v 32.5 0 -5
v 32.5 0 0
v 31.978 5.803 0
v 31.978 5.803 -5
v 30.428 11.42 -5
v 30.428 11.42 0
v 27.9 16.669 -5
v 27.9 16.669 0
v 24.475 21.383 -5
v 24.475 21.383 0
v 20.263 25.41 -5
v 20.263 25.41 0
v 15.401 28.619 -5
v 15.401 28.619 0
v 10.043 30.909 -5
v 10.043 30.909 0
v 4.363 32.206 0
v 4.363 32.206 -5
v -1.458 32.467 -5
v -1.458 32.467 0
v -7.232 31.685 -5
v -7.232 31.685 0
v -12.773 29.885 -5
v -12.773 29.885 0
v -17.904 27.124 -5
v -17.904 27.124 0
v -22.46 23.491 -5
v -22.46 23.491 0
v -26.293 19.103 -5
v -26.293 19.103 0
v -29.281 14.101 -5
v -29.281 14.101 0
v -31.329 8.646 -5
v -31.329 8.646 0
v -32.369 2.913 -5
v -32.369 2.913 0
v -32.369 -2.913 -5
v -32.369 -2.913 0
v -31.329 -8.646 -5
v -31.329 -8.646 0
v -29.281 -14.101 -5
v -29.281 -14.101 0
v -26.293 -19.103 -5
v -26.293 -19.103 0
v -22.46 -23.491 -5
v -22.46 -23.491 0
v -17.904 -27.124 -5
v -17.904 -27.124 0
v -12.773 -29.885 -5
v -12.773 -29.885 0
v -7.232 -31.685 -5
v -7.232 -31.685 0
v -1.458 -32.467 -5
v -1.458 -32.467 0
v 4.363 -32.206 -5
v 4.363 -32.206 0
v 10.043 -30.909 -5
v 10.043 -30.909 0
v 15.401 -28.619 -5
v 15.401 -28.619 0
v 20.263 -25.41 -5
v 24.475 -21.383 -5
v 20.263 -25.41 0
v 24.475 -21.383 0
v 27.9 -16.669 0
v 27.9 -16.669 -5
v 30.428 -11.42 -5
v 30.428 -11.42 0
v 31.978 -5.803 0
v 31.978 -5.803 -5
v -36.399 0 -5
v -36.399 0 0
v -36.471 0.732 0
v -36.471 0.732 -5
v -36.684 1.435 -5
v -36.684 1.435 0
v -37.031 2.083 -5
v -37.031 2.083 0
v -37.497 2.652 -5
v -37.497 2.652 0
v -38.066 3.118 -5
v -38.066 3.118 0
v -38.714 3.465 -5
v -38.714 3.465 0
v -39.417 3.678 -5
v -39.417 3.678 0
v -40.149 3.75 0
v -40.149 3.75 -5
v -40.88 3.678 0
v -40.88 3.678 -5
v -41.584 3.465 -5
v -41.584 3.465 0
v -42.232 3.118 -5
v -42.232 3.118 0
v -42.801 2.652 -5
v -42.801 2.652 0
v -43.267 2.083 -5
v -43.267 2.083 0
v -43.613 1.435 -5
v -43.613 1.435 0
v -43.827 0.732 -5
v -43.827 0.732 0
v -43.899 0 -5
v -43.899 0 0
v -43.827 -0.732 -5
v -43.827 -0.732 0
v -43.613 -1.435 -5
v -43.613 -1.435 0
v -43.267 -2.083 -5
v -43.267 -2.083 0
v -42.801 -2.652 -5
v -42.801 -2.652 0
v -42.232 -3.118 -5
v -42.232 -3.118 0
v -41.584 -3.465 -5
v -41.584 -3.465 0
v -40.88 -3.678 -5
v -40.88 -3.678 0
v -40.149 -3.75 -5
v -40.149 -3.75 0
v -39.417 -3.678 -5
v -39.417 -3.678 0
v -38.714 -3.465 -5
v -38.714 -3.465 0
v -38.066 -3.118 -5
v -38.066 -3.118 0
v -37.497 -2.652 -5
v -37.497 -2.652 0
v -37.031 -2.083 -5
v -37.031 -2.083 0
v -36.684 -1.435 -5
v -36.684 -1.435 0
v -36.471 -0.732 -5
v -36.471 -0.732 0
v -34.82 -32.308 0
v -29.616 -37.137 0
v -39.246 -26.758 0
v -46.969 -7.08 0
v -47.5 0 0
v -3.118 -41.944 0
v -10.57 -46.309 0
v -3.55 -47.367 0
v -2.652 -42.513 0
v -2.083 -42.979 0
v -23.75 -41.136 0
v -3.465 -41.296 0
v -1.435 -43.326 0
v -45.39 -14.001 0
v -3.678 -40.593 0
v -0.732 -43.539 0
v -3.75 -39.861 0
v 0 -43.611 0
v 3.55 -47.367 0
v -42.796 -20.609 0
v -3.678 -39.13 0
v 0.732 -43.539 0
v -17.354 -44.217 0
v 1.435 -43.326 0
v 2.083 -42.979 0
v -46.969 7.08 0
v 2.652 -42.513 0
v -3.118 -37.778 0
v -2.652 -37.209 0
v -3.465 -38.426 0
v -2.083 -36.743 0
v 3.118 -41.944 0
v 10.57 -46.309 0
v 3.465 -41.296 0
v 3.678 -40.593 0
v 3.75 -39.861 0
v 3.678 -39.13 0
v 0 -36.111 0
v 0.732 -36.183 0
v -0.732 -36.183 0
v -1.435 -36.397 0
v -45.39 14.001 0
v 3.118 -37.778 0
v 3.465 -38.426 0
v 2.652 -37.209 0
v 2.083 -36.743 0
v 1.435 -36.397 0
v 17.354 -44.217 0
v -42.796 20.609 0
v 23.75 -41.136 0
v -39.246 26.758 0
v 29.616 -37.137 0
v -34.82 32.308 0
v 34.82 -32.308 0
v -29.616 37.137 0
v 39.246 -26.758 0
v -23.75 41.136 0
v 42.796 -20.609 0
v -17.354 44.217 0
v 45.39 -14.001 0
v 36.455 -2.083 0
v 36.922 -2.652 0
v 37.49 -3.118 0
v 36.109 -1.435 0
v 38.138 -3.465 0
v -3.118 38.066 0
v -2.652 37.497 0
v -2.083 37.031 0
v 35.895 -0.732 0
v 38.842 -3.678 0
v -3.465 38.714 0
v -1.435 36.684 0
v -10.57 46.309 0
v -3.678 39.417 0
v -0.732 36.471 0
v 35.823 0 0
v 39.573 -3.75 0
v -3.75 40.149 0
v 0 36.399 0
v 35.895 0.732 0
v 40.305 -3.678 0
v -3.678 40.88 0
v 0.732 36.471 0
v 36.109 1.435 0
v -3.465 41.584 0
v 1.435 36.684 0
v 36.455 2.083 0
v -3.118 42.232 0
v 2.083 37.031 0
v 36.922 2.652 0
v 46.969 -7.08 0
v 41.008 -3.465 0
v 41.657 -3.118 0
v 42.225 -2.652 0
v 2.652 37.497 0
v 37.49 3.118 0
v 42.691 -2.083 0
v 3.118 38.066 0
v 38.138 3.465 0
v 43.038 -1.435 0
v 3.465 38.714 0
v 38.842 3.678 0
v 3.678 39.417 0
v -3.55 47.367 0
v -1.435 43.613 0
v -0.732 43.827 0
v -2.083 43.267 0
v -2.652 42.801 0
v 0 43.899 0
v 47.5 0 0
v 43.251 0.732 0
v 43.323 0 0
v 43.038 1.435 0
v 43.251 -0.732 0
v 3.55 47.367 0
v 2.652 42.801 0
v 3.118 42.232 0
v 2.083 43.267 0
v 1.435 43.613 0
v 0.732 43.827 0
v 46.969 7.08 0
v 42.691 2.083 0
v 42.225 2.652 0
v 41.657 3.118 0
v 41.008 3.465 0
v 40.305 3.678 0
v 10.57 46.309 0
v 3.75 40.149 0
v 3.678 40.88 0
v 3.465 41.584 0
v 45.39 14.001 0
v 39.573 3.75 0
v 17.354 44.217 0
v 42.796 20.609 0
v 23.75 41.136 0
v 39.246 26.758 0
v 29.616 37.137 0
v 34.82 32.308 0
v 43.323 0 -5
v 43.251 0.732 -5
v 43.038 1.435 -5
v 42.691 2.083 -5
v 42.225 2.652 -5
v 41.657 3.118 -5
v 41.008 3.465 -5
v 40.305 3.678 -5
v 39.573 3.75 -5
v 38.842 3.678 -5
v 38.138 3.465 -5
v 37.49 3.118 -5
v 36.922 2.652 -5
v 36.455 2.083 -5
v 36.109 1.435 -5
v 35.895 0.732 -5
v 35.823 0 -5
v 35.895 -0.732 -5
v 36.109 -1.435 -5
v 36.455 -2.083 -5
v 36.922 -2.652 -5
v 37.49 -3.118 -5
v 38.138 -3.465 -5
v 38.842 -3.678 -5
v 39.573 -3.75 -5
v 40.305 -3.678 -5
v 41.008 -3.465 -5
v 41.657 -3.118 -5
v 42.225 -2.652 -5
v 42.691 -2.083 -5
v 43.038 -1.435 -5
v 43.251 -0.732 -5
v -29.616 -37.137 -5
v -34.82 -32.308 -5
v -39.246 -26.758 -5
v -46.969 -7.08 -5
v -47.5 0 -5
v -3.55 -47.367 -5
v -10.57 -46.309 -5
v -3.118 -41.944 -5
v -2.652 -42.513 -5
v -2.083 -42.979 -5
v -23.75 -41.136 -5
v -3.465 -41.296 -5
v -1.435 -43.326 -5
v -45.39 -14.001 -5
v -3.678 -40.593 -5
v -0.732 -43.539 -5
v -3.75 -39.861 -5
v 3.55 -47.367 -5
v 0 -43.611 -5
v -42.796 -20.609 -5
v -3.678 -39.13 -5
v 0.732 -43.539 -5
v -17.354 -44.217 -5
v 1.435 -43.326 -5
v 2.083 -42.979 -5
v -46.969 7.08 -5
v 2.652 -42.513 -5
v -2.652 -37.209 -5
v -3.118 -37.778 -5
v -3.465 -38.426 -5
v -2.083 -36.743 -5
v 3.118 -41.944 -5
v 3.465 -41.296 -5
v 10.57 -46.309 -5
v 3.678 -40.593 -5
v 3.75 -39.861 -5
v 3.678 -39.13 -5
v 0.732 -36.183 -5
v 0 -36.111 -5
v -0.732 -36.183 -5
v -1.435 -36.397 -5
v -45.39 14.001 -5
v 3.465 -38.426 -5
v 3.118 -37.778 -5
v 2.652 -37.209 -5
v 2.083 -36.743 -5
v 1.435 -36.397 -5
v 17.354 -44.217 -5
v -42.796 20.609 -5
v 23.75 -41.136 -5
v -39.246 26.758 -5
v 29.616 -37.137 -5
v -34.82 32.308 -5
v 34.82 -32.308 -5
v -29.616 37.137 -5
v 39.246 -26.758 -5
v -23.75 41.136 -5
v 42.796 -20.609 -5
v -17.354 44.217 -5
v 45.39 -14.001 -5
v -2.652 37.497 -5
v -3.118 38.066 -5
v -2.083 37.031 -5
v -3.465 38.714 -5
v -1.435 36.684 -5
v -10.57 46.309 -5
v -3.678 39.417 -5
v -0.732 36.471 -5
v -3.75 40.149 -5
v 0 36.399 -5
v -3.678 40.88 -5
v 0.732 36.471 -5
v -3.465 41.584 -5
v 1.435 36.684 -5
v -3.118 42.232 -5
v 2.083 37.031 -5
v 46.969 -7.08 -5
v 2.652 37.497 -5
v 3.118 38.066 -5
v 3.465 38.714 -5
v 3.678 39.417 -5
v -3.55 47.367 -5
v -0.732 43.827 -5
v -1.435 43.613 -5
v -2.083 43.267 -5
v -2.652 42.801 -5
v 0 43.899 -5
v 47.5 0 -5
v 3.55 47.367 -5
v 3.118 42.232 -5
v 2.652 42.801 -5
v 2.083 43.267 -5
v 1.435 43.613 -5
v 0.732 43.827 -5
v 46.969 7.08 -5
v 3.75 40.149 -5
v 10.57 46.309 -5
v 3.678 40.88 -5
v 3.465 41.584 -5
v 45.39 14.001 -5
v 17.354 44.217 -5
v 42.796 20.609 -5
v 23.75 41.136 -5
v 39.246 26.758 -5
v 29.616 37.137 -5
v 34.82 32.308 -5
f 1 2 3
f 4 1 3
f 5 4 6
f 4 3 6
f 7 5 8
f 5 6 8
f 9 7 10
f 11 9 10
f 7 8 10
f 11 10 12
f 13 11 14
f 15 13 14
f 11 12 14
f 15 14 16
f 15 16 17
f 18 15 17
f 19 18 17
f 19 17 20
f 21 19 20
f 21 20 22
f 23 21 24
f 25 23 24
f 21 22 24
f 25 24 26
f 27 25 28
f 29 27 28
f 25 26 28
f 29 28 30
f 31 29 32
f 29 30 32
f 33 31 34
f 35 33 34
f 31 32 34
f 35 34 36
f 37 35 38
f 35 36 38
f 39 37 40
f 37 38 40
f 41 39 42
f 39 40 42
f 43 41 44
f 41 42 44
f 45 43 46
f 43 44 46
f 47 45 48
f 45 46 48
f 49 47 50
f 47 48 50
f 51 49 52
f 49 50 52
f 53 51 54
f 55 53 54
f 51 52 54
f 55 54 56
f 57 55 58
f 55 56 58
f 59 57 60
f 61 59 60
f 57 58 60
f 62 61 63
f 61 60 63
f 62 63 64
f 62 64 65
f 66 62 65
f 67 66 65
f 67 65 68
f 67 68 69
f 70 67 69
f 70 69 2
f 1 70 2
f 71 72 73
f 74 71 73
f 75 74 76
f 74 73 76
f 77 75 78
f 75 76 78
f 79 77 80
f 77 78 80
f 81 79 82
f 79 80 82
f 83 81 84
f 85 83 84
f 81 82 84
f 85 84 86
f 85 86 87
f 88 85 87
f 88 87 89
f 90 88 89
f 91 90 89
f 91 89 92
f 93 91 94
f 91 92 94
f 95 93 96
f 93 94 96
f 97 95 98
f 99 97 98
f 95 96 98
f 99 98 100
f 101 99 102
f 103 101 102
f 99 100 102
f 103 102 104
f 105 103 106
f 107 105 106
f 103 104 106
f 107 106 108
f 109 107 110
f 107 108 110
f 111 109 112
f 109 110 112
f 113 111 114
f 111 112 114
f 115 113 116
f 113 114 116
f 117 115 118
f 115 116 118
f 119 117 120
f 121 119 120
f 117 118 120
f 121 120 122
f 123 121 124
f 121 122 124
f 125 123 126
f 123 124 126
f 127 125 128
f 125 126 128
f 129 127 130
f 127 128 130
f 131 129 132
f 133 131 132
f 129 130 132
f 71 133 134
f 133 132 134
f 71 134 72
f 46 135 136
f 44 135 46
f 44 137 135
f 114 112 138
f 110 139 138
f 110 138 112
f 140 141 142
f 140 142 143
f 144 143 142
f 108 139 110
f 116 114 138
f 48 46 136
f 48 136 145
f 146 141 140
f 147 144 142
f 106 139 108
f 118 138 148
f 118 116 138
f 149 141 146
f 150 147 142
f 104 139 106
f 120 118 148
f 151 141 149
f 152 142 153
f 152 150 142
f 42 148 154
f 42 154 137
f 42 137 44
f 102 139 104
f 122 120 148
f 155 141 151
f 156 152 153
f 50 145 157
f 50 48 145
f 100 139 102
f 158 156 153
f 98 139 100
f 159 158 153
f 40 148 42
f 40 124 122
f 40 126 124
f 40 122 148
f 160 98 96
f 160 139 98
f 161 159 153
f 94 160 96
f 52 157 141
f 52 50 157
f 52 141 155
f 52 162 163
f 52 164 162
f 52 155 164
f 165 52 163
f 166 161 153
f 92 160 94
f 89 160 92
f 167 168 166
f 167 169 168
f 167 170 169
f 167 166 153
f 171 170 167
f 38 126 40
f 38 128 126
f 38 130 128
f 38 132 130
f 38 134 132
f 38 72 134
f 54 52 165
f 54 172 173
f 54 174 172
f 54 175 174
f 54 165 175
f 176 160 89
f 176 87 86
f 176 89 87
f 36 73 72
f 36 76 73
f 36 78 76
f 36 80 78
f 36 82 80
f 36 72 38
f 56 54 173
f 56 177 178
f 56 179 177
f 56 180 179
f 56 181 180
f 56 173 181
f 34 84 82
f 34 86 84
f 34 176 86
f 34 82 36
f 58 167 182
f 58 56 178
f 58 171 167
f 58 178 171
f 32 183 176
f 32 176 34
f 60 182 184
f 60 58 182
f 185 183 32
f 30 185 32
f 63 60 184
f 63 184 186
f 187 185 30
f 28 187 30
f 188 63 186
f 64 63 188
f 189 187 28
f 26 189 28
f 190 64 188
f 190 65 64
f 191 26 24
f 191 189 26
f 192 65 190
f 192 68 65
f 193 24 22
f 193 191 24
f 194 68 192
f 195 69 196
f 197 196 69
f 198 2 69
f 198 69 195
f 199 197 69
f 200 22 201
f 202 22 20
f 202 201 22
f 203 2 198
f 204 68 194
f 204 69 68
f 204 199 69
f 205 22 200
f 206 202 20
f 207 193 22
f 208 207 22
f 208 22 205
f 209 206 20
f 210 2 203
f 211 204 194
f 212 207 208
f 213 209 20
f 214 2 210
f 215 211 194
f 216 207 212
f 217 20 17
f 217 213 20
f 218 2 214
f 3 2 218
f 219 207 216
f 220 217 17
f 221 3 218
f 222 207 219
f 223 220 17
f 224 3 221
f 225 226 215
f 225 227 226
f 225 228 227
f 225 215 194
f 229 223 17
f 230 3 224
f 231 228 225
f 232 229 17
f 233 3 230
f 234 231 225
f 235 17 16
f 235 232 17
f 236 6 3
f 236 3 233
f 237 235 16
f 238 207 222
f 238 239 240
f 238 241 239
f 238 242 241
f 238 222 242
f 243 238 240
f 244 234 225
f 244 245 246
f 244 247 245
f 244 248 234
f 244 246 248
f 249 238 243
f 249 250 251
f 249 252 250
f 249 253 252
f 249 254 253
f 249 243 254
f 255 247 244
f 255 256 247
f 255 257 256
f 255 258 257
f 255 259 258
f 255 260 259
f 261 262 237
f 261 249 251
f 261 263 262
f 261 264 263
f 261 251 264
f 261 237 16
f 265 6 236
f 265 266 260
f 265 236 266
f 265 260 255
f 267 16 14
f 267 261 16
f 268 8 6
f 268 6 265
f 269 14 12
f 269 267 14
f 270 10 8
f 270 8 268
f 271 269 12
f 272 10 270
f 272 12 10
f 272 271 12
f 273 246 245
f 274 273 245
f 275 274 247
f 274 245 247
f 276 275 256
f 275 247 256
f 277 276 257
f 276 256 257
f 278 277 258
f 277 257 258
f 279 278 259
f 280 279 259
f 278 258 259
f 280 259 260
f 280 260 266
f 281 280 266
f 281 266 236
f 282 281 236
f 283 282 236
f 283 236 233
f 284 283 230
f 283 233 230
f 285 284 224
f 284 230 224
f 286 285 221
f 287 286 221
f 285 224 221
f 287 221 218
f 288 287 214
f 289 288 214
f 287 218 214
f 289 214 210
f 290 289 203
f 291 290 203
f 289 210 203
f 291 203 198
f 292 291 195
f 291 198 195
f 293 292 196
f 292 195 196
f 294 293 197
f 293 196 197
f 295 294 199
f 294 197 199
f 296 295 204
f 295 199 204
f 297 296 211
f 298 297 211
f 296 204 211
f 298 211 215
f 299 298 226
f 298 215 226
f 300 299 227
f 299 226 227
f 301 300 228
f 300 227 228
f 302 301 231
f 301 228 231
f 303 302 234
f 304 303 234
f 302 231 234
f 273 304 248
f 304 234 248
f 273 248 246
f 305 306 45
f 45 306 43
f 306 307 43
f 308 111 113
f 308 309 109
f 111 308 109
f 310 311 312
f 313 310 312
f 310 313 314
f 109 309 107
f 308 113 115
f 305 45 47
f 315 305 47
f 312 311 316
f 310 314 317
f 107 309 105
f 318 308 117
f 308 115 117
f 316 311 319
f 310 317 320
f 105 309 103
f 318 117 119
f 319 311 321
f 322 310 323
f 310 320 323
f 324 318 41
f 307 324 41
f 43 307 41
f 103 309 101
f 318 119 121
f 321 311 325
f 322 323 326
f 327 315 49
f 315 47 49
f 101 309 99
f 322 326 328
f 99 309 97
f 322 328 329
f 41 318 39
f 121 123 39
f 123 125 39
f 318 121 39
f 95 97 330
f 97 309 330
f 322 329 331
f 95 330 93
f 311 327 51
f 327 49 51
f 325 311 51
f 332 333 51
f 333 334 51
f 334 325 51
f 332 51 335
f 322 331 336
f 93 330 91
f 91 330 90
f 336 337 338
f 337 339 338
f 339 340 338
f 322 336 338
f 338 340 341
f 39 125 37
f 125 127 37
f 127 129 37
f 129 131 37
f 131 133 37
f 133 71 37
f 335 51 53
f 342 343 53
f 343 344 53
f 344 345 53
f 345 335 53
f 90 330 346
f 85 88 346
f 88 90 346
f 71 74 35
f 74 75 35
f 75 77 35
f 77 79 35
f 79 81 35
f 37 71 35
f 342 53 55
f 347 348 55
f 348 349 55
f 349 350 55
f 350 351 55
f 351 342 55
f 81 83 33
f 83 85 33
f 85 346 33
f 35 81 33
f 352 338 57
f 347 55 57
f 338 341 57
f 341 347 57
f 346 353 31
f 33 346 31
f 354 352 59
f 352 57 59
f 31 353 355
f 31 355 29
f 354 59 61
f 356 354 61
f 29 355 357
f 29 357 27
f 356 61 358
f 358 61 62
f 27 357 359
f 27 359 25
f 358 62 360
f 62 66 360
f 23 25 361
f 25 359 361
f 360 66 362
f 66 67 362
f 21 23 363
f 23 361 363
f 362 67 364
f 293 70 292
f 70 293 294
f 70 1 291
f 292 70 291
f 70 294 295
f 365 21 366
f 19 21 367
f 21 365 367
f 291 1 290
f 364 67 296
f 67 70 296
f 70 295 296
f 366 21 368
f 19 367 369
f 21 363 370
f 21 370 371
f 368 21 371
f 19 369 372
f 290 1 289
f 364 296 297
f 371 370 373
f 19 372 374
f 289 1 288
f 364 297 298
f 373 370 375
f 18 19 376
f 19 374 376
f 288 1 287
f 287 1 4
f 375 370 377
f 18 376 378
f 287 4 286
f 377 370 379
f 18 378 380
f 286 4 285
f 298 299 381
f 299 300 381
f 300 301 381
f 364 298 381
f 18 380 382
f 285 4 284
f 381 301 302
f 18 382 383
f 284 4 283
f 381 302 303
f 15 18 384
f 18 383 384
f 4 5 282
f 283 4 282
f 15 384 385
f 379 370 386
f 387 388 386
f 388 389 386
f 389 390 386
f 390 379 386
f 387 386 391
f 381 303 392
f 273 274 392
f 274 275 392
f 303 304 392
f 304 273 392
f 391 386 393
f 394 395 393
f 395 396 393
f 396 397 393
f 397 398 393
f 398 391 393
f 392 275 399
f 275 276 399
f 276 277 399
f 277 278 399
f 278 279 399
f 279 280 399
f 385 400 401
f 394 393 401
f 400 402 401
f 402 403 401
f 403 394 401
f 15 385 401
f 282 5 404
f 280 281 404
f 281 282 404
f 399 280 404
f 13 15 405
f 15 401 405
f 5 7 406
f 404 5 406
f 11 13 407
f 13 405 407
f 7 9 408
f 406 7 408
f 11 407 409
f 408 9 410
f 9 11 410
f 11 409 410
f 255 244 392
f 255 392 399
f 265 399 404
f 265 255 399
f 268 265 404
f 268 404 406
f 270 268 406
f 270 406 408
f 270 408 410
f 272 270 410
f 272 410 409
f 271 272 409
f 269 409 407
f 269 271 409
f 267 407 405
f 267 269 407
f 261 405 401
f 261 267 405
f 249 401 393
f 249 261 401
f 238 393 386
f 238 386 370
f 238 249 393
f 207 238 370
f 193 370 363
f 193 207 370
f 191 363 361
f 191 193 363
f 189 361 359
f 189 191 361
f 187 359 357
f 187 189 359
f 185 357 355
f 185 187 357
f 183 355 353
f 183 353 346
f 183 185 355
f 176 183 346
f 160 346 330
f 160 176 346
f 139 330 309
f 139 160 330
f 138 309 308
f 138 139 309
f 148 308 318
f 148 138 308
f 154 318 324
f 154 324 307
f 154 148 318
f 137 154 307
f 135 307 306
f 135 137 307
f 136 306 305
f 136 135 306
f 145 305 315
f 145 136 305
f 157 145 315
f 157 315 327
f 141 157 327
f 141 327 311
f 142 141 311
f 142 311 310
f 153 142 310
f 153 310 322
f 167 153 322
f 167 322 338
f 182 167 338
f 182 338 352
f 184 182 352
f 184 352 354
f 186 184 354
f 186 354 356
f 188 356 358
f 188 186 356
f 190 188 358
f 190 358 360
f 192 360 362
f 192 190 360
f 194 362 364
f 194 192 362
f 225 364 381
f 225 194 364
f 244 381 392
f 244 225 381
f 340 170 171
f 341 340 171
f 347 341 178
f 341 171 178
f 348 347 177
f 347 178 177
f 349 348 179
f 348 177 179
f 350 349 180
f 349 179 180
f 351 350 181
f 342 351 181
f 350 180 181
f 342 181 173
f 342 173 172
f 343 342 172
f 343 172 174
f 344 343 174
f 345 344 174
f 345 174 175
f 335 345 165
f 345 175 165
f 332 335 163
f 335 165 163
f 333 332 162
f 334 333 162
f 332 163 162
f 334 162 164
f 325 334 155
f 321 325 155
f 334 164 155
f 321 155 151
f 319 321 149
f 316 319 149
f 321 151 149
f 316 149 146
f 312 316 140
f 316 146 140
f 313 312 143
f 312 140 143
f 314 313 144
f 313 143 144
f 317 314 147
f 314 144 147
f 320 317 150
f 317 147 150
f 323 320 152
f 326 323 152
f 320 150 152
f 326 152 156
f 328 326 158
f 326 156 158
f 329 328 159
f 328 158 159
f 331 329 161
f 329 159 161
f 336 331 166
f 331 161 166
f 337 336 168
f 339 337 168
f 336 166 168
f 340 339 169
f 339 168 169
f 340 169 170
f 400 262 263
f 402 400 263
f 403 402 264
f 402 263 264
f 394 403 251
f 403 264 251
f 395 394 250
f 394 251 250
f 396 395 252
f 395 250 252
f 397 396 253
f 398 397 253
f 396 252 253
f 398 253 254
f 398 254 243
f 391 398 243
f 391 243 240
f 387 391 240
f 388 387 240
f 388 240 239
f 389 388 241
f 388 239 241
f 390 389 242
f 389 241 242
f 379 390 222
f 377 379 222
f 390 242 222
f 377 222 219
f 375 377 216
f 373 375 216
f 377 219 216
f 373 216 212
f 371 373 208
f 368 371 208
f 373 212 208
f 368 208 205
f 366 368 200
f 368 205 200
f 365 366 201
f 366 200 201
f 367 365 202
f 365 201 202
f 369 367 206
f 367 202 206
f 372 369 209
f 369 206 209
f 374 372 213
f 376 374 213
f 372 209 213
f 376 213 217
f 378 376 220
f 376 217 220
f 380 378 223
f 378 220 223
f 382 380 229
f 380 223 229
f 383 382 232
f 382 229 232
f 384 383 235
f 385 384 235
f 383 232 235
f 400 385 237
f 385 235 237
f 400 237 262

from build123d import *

# Parameters (mm, degrees)
F0_R     = 47.5
F0_R_2   = 3.75
F0_R_3   = 32.5
F1_DEPTH = 5


with BuildPart() as f1:
    # F0 (on Top) → F1 (new body)
    with BuildSketch(Plane.XY):
        Circle(F0_R)
        with Locations((0, -39.861098)):
            Circle(F0_R_2, mode=Mode.SUBTRACT)
        with Locations((-40.148903, 0)):
            Circle(F0_R_2, mode=Mode.SUBTRACT)
        Circle(F0_R_3, mode=Mode.SUBTRACT)
        with Locations((39.573293, 0)):
            Circle(F0_R_2, mode=Mode.SUBTRACT)
        with Locations((0, 40.148903)):
            Circle(F0_R_2, mode=Mode.SUBTRACT)
    extrude(amount=-F1_DEPTH)


solid = f1.part
